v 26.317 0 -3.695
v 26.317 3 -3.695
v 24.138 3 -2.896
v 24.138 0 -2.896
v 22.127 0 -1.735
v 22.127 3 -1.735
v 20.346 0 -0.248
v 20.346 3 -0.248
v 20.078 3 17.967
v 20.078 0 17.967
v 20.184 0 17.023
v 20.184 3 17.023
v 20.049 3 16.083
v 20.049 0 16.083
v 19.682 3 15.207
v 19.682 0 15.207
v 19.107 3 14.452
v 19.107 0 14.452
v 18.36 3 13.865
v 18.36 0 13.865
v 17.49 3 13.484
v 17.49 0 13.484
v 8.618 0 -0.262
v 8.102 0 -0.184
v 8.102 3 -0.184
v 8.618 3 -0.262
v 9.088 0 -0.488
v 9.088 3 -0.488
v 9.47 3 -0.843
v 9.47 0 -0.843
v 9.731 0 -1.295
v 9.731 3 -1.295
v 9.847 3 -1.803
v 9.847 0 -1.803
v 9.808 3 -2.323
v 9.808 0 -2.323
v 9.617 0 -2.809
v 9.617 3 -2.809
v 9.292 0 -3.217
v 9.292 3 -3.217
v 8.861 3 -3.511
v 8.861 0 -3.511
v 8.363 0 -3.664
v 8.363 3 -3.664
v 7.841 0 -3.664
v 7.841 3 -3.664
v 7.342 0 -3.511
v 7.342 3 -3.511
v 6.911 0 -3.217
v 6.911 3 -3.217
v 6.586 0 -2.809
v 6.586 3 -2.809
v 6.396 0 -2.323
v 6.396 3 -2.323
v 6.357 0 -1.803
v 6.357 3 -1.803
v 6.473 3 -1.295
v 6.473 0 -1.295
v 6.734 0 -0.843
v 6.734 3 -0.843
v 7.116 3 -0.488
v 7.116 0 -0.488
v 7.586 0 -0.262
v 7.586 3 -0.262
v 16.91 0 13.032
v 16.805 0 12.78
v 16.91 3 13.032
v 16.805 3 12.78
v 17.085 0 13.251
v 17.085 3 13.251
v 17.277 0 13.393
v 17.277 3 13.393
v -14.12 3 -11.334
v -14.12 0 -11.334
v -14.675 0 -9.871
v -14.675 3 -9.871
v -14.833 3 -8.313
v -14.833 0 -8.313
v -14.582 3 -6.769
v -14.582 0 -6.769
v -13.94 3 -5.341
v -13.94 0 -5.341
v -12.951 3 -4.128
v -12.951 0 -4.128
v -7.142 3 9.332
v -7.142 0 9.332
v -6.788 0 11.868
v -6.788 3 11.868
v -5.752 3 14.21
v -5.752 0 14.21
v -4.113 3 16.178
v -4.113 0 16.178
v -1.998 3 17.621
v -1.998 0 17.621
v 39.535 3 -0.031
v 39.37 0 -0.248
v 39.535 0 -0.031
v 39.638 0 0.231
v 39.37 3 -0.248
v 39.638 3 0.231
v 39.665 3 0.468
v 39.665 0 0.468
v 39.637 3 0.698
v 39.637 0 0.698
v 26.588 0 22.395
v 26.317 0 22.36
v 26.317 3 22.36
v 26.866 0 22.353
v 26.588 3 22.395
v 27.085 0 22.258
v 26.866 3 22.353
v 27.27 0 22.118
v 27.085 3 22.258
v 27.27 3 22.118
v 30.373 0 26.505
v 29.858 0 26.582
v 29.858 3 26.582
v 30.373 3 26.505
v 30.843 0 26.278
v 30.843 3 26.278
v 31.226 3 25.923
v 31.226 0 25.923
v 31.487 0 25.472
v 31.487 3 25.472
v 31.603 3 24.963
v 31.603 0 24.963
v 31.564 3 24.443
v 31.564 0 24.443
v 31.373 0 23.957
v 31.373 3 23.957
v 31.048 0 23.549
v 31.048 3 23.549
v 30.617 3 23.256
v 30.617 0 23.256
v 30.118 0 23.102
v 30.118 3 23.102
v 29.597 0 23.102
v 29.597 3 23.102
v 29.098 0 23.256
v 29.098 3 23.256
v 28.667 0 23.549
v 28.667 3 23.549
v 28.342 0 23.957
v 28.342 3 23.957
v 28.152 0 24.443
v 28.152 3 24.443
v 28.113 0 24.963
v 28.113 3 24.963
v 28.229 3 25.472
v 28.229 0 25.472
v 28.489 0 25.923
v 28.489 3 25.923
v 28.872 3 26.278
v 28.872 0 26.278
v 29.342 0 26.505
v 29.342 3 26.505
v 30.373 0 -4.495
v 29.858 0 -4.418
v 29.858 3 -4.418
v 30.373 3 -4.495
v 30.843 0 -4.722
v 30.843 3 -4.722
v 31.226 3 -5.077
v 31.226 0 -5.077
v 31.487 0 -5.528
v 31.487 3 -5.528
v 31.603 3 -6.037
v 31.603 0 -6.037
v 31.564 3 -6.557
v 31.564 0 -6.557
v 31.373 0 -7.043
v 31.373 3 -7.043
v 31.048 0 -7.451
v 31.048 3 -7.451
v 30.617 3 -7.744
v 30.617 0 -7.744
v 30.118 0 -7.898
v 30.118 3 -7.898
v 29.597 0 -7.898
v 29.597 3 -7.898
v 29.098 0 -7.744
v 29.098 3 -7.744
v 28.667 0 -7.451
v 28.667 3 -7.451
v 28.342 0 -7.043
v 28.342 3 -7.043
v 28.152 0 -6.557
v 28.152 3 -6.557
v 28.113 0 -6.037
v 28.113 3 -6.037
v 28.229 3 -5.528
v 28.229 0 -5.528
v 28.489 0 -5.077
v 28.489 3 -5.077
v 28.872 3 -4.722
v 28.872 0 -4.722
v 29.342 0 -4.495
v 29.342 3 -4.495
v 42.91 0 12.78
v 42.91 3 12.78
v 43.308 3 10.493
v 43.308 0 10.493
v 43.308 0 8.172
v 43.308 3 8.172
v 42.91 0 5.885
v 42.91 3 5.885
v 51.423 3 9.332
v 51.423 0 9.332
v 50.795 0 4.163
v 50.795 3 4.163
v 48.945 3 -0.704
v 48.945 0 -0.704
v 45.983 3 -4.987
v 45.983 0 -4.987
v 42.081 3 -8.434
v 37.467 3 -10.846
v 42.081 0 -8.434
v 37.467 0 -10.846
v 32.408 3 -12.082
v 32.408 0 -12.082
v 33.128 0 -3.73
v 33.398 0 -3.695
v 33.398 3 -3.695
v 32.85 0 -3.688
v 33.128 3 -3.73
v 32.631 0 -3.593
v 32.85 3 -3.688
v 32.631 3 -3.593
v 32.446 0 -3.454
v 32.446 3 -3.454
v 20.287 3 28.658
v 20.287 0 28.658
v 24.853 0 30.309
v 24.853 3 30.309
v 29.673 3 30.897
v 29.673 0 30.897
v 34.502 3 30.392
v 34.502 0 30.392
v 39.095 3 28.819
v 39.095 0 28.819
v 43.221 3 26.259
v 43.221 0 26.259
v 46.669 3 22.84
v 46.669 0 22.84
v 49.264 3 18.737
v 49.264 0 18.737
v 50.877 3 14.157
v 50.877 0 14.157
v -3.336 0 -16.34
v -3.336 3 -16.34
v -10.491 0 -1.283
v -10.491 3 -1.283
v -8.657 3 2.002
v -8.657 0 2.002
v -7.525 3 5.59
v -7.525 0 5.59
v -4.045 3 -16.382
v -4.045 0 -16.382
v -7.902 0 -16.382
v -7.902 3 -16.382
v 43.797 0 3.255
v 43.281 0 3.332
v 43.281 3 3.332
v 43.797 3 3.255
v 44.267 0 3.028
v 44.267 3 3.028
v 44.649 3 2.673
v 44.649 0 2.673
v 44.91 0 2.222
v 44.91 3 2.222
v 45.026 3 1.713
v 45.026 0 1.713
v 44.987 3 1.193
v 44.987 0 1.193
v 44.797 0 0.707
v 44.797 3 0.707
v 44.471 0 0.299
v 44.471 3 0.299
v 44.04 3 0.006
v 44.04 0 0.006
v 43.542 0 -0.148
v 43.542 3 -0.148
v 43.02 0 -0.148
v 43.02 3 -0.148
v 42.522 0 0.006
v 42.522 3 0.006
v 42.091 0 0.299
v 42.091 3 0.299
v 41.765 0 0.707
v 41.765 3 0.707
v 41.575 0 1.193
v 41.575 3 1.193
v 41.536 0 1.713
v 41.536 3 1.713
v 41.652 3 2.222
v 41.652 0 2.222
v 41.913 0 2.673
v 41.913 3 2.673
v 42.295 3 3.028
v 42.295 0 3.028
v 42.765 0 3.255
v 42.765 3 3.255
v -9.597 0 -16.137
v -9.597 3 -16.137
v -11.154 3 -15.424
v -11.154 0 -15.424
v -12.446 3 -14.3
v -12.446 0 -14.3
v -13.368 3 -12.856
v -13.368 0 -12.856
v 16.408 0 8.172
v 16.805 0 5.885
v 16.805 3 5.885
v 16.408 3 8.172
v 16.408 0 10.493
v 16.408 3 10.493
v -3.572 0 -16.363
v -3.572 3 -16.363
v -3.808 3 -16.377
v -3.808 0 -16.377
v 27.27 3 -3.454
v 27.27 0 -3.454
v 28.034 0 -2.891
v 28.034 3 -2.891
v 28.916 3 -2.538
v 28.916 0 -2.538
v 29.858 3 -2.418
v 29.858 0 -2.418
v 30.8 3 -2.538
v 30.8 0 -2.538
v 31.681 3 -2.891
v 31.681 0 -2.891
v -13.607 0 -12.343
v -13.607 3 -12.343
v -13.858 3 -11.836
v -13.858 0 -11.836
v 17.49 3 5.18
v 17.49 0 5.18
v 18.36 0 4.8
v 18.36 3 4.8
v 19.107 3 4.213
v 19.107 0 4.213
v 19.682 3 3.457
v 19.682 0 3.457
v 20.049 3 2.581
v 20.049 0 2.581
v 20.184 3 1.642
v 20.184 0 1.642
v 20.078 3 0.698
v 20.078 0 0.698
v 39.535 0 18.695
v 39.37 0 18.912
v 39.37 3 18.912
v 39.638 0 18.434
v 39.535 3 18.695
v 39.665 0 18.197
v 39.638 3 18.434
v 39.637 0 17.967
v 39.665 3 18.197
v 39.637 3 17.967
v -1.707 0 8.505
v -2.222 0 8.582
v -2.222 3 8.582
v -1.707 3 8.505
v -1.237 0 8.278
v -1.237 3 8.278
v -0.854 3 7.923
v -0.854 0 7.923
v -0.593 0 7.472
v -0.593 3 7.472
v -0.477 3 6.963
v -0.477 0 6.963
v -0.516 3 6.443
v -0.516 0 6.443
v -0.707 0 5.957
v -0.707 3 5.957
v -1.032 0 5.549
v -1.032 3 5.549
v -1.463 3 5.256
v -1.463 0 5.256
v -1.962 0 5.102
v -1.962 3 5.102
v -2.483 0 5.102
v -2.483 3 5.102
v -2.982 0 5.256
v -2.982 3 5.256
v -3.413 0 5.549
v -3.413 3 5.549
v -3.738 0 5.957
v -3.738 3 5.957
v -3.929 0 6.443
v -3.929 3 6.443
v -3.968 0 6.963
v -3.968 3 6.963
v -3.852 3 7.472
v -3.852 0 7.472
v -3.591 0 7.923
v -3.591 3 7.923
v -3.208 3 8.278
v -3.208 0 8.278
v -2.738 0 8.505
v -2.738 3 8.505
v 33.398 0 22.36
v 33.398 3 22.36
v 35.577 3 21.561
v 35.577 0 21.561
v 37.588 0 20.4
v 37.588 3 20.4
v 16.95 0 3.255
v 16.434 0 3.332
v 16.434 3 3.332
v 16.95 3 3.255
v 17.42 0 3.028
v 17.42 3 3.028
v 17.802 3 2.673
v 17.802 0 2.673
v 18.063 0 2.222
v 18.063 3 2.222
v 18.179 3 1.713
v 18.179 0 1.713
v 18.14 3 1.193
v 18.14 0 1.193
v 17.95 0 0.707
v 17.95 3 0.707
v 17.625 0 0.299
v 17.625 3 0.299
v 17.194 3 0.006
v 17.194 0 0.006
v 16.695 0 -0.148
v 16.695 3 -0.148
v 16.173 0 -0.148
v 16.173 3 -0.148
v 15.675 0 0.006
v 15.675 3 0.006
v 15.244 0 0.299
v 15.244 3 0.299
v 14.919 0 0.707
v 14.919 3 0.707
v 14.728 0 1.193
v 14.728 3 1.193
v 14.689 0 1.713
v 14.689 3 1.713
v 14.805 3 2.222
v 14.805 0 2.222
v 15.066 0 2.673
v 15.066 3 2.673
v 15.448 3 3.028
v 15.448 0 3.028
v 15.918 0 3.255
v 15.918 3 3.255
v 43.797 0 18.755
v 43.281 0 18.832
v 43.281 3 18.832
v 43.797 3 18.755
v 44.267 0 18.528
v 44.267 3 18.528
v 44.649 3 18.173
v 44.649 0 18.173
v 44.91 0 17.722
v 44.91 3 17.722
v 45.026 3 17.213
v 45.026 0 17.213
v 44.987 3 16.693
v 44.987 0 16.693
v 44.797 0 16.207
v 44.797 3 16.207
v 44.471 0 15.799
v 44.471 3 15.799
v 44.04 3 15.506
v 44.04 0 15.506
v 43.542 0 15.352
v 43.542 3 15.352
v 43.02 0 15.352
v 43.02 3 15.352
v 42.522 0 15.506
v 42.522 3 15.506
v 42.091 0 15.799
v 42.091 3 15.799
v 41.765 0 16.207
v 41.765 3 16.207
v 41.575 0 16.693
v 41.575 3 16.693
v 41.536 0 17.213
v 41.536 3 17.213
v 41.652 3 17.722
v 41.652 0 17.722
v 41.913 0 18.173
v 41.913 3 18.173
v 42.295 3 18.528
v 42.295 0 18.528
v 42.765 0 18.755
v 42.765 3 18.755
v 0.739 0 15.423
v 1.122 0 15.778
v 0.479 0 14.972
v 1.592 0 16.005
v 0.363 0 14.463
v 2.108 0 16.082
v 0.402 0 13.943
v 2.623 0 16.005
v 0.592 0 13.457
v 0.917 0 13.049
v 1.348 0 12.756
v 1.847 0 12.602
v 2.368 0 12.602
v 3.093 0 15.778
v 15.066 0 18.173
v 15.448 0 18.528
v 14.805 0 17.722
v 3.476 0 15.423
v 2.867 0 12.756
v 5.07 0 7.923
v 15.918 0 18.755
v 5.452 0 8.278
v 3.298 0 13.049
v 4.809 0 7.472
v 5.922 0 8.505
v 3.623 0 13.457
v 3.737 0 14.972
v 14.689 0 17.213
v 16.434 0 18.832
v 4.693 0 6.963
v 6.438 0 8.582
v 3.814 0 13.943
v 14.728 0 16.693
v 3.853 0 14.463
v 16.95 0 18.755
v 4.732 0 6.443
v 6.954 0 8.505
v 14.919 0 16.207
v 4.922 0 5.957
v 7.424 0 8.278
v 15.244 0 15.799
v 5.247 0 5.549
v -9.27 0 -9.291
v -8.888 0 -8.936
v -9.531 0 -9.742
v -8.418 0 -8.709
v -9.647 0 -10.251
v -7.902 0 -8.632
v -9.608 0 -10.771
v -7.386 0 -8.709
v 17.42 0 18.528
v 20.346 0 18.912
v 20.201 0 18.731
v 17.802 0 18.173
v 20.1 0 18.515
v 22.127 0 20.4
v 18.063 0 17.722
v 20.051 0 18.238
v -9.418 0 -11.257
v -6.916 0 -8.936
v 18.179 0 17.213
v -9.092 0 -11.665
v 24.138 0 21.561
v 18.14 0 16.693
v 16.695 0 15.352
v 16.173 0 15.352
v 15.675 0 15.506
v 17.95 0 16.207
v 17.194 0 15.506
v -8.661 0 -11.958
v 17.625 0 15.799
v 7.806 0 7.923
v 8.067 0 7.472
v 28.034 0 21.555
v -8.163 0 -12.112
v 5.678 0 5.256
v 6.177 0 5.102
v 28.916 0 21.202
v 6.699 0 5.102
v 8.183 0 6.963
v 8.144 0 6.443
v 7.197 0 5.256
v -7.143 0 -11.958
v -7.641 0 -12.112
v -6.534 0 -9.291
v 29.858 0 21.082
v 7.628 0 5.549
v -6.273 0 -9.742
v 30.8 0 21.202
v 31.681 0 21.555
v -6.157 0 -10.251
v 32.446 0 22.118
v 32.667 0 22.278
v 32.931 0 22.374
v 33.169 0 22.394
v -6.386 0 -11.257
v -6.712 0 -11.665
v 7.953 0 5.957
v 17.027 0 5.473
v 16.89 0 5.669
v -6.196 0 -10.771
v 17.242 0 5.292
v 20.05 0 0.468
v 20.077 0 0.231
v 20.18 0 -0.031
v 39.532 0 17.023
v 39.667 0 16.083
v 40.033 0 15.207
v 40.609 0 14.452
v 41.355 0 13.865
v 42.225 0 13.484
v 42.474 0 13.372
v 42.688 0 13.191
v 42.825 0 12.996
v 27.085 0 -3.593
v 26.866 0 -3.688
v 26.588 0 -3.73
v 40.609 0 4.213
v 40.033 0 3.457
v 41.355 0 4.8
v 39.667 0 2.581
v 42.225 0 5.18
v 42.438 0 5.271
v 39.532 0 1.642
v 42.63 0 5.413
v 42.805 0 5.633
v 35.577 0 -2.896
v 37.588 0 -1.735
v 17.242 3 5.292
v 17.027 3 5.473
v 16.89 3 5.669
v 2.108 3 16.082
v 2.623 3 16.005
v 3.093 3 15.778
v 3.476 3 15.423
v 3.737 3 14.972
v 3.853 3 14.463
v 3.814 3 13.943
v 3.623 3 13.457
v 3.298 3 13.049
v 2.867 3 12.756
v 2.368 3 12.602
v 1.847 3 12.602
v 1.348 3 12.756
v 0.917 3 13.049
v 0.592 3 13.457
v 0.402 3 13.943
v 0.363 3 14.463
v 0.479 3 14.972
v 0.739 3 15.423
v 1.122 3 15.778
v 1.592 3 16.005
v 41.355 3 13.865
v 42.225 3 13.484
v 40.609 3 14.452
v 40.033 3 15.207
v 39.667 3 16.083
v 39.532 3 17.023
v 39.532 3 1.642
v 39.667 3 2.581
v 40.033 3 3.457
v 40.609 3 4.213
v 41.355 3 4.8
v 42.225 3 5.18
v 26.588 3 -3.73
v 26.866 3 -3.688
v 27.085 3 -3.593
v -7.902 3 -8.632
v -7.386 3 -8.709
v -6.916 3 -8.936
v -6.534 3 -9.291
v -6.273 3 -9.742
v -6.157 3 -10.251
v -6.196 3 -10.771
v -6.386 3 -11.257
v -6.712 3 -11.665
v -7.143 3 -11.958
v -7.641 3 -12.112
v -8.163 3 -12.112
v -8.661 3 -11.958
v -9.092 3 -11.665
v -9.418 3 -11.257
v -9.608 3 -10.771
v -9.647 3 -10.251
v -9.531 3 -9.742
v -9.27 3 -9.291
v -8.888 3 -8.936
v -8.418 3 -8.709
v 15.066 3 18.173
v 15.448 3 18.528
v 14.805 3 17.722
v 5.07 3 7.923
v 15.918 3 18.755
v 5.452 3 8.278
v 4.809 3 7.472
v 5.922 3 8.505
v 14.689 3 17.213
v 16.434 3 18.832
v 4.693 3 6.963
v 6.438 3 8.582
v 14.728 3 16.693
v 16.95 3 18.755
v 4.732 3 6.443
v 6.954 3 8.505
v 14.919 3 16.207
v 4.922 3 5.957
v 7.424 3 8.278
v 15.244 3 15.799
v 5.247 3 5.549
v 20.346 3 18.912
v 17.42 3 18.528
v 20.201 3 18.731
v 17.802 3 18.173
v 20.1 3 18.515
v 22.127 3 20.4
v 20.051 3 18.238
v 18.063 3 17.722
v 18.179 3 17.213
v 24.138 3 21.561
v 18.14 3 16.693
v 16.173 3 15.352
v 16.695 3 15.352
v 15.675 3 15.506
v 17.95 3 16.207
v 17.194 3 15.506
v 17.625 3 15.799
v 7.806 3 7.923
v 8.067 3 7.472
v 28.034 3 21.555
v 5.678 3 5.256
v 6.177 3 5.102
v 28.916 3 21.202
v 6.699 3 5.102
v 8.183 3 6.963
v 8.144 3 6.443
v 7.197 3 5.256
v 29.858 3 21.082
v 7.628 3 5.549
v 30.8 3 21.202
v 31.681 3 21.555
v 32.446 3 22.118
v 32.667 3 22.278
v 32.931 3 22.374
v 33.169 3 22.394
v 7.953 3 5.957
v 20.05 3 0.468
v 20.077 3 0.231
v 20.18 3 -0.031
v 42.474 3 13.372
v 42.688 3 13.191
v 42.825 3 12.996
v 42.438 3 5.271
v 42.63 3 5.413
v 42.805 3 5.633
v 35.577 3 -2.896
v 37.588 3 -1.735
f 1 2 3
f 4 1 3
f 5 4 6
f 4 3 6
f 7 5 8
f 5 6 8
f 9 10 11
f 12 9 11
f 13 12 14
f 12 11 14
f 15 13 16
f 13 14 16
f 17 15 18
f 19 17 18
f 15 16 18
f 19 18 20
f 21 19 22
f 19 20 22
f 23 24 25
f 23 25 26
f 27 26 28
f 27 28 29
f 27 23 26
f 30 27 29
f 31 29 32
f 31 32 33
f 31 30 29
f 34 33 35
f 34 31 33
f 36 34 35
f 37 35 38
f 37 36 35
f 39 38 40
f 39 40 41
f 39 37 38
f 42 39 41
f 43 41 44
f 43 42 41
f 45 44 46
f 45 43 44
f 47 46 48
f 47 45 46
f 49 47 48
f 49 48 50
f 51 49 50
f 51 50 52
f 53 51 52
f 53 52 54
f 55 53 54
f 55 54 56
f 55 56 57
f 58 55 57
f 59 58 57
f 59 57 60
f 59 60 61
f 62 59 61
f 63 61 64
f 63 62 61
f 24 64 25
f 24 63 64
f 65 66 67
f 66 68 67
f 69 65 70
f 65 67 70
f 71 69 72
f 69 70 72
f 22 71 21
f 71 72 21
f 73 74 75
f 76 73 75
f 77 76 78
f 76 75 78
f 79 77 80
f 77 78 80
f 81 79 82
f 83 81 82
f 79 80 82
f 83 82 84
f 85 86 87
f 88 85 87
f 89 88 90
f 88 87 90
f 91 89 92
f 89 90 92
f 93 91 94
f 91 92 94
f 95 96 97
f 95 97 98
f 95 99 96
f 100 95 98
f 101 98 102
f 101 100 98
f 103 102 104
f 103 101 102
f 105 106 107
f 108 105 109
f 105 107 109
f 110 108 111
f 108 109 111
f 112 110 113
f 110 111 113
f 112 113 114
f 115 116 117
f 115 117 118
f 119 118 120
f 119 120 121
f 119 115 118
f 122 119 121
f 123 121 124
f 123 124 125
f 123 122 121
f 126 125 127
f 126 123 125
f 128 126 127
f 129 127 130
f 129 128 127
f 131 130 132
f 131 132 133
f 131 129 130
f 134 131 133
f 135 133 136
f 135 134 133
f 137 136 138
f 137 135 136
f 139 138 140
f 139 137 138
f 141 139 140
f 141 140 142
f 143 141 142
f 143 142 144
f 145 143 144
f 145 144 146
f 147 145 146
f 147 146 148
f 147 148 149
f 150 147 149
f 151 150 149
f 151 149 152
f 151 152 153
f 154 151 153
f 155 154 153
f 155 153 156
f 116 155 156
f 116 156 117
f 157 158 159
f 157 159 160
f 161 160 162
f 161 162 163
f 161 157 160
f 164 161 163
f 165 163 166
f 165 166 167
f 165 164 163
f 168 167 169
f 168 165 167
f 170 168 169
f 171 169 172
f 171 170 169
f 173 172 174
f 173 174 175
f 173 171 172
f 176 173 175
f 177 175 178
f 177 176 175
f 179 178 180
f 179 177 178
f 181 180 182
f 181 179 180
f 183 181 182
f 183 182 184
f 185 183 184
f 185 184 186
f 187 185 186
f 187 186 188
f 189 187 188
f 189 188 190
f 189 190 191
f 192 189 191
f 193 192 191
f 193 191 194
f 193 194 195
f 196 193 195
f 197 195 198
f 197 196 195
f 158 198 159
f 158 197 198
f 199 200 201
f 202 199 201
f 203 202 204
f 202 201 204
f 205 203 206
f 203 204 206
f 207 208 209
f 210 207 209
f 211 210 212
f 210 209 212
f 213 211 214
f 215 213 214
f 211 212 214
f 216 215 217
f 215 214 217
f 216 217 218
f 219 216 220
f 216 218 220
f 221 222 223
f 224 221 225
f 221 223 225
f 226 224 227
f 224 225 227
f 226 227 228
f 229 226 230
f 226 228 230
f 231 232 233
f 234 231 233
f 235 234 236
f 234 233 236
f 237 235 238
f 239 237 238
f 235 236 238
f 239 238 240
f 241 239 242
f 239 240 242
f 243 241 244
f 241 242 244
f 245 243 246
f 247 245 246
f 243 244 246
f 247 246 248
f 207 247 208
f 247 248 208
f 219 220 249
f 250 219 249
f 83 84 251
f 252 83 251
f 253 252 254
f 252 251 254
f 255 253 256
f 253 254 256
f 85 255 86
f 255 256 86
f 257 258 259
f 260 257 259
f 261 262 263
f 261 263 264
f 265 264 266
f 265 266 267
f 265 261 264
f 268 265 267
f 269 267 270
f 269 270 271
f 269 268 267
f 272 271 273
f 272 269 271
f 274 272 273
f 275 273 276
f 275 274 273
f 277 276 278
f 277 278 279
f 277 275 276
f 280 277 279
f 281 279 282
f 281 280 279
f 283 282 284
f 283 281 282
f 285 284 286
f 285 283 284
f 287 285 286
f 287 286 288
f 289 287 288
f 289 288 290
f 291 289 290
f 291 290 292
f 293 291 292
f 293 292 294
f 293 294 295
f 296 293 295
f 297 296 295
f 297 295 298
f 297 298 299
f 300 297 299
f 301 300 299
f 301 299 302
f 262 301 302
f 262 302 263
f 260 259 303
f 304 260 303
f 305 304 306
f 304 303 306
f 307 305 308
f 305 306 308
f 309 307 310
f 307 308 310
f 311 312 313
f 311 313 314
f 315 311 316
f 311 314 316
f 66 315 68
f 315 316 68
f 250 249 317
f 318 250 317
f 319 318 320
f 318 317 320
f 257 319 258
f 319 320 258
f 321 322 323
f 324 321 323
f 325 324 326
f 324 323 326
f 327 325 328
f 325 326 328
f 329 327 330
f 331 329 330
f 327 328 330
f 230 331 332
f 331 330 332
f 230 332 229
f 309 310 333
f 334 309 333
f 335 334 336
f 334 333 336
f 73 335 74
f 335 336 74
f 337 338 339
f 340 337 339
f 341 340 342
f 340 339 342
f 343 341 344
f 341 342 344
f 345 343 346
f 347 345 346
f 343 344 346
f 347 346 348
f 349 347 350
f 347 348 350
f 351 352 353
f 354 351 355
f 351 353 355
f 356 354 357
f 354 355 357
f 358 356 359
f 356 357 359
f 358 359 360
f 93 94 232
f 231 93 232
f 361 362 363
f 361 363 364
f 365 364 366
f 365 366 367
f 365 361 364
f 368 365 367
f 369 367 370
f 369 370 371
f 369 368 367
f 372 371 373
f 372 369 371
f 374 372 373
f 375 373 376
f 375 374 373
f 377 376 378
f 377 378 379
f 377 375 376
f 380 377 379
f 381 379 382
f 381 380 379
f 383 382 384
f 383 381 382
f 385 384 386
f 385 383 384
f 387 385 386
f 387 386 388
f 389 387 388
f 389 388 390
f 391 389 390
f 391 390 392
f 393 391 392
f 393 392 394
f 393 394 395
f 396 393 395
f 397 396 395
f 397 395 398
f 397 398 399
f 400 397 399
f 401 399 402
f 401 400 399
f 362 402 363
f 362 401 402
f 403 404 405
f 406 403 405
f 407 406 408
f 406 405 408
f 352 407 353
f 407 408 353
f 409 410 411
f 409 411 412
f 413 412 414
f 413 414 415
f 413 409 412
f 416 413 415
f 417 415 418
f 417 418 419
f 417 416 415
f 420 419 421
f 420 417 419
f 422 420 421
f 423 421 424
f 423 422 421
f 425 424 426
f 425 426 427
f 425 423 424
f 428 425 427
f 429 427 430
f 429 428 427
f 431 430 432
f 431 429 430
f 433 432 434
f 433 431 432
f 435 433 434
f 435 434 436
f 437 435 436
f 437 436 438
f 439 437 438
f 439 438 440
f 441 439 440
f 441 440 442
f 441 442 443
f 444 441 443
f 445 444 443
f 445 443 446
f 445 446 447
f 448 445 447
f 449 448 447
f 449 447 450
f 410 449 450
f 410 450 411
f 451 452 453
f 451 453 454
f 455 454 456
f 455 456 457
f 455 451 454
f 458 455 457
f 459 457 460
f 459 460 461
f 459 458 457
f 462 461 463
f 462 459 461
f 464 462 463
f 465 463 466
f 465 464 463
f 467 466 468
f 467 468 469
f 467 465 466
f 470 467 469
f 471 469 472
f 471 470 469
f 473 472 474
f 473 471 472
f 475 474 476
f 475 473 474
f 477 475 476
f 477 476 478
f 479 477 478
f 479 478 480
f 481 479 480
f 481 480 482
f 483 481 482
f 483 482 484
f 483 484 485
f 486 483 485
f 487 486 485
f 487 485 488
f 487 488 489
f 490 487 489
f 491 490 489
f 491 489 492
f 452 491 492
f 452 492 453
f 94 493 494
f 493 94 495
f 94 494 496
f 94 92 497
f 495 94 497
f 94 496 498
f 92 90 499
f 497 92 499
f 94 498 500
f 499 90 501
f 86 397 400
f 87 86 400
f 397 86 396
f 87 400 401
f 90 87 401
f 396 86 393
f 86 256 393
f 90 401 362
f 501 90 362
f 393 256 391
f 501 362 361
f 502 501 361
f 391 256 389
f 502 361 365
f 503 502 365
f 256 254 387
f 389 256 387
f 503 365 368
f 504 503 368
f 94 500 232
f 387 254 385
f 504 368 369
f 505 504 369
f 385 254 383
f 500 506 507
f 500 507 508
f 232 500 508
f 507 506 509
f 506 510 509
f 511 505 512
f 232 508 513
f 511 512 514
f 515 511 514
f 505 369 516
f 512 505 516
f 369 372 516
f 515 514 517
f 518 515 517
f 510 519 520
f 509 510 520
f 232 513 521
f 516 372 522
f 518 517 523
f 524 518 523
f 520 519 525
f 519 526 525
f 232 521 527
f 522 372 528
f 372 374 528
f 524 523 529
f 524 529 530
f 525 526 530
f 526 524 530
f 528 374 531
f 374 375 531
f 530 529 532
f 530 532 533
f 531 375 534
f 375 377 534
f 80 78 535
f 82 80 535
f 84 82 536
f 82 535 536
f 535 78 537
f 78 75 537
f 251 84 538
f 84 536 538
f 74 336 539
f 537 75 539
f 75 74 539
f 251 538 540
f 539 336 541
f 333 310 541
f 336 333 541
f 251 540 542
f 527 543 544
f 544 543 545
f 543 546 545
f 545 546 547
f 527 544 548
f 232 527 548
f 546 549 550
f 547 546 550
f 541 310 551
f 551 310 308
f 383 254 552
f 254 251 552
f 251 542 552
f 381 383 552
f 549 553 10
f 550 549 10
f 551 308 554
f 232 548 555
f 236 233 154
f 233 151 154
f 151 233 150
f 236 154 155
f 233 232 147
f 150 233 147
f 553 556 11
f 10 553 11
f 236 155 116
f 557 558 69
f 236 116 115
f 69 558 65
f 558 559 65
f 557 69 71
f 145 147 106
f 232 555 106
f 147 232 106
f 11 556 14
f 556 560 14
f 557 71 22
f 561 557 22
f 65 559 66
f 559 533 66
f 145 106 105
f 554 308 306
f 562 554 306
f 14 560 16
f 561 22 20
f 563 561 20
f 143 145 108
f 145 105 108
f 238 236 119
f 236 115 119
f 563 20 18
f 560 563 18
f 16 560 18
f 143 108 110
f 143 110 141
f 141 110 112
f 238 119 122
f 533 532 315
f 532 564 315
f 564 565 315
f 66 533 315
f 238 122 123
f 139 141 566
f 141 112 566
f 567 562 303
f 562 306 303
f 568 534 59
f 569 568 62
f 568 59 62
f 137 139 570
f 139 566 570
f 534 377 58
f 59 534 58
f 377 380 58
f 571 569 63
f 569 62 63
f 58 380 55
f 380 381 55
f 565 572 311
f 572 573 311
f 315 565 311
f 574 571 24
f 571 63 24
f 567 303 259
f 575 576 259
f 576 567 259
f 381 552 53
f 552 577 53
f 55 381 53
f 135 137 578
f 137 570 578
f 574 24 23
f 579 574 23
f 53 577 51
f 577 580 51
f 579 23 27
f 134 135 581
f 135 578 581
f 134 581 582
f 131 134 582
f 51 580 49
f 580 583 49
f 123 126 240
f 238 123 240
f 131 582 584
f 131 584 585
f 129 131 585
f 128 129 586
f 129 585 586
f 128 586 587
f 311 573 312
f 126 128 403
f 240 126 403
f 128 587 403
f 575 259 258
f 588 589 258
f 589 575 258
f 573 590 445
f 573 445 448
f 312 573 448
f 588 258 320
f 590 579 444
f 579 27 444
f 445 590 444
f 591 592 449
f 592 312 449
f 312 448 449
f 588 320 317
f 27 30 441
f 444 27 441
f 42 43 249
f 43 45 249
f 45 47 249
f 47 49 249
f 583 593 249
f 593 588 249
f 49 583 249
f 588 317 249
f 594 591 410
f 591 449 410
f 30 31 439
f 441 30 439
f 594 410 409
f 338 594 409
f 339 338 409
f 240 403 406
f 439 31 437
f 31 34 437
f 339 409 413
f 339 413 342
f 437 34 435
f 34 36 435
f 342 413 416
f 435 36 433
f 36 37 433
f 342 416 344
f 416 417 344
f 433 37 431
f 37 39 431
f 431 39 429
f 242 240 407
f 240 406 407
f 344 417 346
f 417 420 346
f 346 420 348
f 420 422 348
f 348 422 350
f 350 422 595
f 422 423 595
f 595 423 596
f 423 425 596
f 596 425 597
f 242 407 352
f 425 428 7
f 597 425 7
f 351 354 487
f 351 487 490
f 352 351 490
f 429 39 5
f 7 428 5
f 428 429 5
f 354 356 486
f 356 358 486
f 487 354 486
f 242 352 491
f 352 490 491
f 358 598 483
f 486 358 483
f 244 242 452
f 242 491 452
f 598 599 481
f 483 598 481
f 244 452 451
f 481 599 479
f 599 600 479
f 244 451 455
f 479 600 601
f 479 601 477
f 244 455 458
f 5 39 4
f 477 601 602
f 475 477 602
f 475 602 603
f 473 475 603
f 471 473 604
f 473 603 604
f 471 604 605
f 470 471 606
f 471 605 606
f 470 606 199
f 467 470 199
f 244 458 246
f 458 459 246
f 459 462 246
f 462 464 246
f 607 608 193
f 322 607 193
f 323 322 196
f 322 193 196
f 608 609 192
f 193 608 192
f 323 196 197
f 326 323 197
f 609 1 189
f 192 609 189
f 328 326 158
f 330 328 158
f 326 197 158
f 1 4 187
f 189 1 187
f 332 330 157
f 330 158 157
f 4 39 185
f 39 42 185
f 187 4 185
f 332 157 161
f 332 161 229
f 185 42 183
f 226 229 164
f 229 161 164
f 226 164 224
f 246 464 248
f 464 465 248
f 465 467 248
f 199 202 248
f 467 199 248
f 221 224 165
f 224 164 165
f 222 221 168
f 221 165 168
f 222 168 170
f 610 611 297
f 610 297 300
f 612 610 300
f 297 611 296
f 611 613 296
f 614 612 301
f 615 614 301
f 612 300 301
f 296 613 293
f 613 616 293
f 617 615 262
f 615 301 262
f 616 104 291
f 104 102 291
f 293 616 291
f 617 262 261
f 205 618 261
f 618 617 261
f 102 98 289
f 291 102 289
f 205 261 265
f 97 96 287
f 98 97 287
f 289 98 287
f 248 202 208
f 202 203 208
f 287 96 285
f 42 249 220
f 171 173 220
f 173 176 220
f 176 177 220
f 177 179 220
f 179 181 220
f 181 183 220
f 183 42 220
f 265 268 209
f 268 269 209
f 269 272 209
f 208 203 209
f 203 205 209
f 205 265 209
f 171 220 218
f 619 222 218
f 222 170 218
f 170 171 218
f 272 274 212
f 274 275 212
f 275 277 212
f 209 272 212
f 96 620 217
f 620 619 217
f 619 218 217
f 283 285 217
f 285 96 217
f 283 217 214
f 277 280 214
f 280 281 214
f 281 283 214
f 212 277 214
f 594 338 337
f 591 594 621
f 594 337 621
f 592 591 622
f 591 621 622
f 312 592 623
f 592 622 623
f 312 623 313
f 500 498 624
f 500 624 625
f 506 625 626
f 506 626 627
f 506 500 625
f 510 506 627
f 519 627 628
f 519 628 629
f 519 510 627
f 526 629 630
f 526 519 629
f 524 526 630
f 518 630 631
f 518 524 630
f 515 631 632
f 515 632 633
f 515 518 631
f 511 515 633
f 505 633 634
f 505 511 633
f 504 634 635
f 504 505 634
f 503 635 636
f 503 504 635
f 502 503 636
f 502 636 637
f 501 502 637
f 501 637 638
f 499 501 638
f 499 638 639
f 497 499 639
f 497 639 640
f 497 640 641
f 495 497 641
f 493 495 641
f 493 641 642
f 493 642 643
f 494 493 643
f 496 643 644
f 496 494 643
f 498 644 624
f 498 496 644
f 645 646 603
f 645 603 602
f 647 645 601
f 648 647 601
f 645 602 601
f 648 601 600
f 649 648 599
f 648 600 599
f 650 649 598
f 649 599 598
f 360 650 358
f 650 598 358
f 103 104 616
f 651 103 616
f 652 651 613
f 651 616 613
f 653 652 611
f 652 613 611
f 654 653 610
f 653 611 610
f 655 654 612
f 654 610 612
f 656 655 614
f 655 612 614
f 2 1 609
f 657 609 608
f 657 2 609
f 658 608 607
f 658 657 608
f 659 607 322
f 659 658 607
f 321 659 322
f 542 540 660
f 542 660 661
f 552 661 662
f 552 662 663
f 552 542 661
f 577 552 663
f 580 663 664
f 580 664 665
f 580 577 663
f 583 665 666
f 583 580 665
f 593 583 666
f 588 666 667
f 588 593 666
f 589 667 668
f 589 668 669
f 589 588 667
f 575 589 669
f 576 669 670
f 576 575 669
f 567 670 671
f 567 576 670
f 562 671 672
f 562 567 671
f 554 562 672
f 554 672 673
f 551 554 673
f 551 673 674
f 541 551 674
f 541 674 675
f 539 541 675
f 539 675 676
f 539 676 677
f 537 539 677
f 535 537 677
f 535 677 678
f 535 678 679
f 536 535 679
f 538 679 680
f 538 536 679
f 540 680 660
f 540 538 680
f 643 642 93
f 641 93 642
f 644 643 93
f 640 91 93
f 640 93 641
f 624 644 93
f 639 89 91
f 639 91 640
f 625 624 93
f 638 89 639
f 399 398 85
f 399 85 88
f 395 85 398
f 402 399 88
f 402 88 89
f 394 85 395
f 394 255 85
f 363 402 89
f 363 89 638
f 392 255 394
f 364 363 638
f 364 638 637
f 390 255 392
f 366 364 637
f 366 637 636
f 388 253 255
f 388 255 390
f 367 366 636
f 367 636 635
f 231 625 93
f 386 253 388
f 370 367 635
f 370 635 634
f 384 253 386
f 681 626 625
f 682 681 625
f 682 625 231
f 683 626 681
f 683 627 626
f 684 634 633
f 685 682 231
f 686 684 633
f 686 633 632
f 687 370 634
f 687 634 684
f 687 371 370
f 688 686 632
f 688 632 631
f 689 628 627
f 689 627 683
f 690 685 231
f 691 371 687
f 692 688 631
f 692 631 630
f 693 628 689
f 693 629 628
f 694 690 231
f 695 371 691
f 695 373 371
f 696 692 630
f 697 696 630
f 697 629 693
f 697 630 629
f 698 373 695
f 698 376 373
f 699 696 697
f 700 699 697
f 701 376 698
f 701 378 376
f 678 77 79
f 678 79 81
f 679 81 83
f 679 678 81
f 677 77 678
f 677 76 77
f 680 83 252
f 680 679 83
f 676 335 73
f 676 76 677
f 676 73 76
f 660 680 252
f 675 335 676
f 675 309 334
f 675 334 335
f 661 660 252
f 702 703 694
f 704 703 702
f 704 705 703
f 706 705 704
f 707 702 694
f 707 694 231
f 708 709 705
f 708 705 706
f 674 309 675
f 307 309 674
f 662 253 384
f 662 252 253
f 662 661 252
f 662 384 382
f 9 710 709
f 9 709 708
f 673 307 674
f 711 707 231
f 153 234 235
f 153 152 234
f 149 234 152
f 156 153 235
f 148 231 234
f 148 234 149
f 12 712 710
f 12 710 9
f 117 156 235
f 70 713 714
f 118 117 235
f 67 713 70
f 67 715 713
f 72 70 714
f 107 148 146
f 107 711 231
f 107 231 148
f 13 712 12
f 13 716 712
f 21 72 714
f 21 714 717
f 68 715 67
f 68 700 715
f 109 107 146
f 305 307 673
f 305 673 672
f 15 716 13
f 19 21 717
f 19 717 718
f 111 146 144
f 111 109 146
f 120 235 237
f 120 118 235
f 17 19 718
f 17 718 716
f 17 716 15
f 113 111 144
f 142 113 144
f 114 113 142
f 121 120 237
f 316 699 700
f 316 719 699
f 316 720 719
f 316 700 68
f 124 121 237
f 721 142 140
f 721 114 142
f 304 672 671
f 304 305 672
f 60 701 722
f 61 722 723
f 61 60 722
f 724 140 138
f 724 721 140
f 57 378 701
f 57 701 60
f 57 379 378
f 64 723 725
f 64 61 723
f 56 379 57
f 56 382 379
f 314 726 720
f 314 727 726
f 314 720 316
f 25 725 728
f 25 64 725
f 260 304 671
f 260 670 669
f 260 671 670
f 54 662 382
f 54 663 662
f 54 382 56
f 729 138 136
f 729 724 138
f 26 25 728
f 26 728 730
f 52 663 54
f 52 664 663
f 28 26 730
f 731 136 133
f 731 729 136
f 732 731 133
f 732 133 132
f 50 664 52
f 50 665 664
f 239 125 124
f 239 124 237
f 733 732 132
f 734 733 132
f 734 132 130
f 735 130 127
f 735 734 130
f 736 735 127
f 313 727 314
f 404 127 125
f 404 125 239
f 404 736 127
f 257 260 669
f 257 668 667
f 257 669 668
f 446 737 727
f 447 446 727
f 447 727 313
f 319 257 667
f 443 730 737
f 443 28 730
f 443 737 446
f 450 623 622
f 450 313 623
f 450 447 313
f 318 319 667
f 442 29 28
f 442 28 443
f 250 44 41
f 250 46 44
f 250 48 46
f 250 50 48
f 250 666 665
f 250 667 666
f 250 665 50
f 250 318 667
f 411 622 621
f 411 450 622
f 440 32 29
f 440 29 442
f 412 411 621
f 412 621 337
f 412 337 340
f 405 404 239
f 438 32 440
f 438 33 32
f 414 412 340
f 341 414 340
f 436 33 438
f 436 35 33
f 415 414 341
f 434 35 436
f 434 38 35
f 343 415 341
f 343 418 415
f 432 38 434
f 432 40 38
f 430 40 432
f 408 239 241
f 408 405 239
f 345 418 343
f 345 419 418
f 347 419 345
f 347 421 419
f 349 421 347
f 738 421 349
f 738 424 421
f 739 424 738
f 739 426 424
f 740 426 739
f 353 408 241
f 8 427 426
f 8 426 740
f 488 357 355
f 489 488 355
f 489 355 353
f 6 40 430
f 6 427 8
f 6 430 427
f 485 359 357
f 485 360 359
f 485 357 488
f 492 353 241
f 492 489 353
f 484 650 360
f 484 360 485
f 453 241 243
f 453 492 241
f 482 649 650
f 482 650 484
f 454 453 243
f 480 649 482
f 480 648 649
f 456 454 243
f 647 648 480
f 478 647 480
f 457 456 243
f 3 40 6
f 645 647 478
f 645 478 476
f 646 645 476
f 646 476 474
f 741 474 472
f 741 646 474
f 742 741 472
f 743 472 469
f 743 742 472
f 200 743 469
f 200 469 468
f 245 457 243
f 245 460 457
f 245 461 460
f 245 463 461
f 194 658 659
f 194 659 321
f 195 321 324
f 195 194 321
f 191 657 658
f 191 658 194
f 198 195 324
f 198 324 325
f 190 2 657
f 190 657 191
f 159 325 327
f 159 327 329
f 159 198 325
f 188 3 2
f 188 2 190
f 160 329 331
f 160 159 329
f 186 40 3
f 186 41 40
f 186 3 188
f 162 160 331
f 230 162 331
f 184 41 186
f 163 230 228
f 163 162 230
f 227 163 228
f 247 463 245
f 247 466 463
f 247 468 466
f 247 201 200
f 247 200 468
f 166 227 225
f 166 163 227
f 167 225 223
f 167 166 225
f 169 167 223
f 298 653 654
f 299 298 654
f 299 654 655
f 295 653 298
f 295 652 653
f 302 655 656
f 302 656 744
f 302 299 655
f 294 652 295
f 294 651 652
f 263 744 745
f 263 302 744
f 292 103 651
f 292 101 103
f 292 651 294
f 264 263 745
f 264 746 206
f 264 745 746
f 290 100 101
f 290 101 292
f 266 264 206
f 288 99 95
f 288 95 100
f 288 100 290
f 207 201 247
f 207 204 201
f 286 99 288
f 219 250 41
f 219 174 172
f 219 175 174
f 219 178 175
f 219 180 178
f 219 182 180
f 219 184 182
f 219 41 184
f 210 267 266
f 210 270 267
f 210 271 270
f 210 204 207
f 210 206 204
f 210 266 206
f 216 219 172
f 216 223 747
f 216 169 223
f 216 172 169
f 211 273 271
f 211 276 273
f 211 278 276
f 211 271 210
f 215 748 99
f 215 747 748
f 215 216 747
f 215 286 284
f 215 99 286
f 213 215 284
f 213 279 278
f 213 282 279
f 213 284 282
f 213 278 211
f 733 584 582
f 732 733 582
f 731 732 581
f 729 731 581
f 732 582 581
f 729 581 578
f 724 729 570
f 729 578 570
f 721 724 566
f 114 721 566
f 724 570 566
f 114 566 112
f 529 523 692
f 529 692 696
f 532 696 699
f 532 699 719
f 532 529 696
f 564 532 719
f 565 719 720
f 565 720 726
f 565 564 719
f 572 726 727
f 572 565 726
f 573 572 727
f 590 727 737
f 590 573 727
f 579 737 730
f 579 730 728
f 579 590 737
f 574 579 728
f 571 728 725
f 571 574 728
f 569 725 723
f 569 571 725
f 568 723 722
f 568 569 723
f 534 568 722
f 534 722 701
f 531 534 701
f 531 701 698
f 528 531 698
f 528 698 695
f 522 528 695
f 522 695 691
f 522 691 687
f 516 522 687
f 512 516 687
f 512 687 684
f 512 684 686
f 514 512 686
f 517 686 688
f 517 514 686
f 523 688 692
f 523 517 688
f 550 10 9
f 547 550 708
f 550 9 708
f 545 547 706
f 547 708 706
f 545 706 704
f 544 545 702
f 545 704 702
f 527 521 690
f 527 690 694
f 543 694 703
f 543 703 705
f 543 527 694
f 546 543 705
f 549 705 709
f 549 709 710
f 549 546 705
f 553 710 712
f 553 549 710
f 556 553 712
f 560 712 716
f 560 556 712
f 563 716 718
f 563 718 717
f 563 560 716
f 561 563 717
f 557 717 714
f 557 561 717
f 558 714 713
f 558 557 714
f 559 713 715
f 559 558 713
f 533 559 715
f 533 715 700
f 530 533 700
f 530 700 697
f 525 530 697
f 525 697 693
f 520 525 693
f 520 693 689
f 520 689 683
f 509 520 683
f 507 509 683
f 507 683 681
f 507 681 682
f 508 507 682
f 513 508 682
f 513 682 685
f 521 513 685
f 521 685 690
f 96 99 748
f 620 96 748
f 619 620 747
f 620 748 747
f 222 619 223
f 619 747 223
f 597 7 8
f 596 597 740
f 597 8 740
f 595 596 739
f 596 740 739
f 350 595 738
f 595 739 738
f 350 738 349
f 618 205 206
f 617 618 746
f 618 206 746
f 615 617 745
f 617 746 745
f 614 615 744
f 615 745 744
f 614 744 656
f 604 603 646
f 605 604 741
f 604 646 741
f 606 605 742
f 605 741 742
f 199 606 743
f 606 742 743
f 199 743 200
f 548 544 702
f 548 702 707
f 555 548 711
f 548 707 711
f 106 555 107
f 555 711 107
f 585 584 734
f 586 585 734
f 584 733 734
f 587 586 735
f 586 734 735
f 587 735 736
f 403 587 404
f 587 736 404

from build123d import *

# Parameters (mm, degrees)
SKETCH_2_R                       = 1.75
EXTRUDE_1_DEPTH                  = 3
CUT_EXTRUDE_1_REACH              = 62.067
SKETCH_3_R                       = 13.5
EXTRUDE_START                    = -3
SKETCH_4_R                       = 3.75
SKETCH_4_R_2                     = 1.75
EXTRUDE_2_DEPTH                  = 3
FILLET_1_R                       = 1
PATTERN_CIRCULAR_1_COUNT         = 6
FILLET_1_OF_PATTERN_CIRCULAR_1_R = 1


with BuildPart() as part:
    # 草图2 → 凸台-拉伸1 (new body)
    with BuildSketch(Plane(origin=(0, 0, 0), x_dir=(1, 0, 0), z_dir=(0, 1, 0))):
        with BuildLine():
            ThreePointArc((-3.33566455, 16.339576043), (-3.689884424, 16.371156277), (-4.04535307, 16.381695363))
            Line((-4.04535307, 16.381695363), (-7.902002826, 16.381695363))
            ThreePointArc((-7.902002826, 16.381695363), (-11.154056436, 15.423931704), (-13.367877124, 12.856411137))
            ThreePointArc((-13.367877124, 12.856411137), (-13.731255095, 12.088797564), (-14.12049634, 11.333969504))
            ThreePointArc((-14.12049634, 11.333969504), (-14.757788596, 7.532855597), (-12.951275808, 4.128282218))
            ThreePointArc((-12.951275808, 4.128282218), (-8.656551428, -2.002025351), (-7.142353364, -9.332273137))
            ThreePointArc((-7.142353364, -9.332273137), (-5.751591288, -14.210272651), (-1.997514606, -17.62143179))
            Line((-1.997514606, -17.62143179), (20.286858748, -28.657647844))
            ThreePointArc((20.286858748, -28.657647844), (50.527581311, -15.482386054), (32.408442676, 12.08182334))
            Line((32.408442676, 12.08182334), (-3.33566455, 16.339576043))
        make_face()
        with Locations((2.107646636, -14.332273137)):
            Circle(SKETCH_2_R, mode=Mode.SUBTRACT)
        with Locations((-2.222480383, -6.832273137)):
            Circle(SKETCH_2_R, mode=Mode.SUBTRACT)
        with Locations((6.437773655, -6.832273137)):
            Circle(SKETCH_2_R, mode=Mode.SUBTRACT)
        with Locations((8.10172473, 1.934042232)):
            Circle(SKETCH_2_R, mode=Mode.SUBTRACT)
        with Locations((-7.902002826, 10.381695363)):
            Circle(SKETCH_2_R, mode=Mode.SUBTRACT)
        with Locations((29.857646636, -24.832273137)):
            Circle(SKETCH_2_R, mode=Mode.SUBTRACT)
        with Locations((43.281040395, -17.082273137)):
            Circle(SKETCH_2_R, mode=Mode.SUBTRACT)
        with Locations((16.434252877, -1.582273137)):
            Circle(SKETCH_2_R, mode=Mode.SUBTRACT)
        with Locations((43.281040395, -1.582273137)):
            Circle(SKETCH_2_R, mode=Mode.SUBTRACT)
        with Locations((29.857646636, 6.167726863)):
            Circle(SKETCH_2_R, mode=Mode.SUBTRACT)
        with Locations((16.434252877, -17.082273137)):
            Circle(SKETCH_2_R, mode=Mode.SUBTRACT)
    extrude(amount=EXTRUDE_1_DEPTH)

    # 草图3 → 切除-拉伸1 (cut, up to next)
    with BuildSketch(Plane(origin=(0, 3, 0), x_dir=(1, 0, 0), z_dir=(0, 1, 0)), mode=Mode.PRIVATE) as cut_extrude_1_sk1:
        with Locations((29.857646636, -9.332273137)):
            Circle(SKETCH_3_R)
    cut_extrude_1_tool1 = extrude(cut_extrude_1_sk1.sketch, amount=-CUT_EXTRUDE_1_REACH, mode=Mode.PRIVATE) & part.part
    add(cut_extrude_1_tool1.solids().sort_by_distance((29.857647, 3, 9.332273))[0], mode=Mode.SUBTRACT)

    # 草图4 → 凸台-拉伸2 (add)
    with BuildSketch(Plane(origin=(0, 3, 0), x_dir=(1, 0, 0), z_dir=(0, 1, 0)).offset(EXTRUDE_START)):
        with Locations((29.857646636, 6.167726863)):
            Circle(SKETCH_4_R)
        with Locations((29.857646636, 6.167726863)):
            Circle(SKETCH_4_R_2, mode=Mode.SUBTRACT)
    extrude_2 = extrude(amount=EXTRUDE_2_DEPTH)

    # 圆角1
    fillet_1_edges = [part.edges().sort_by_distance(p)[0] for p in [
        (32.800222011, 1.5, -3.843130088),
        (26.915071261, 1.5, -3.843130088),
    ]]
    fillet(fillet_1_edges, radius=FILLET_1_R)

    # 阵列(圆周)1: 凸台-拉伸2 ×6 about axis
    pattern_circular_1_axis = Axis((29.857646636, 3, 9.332273137), (0, -1, 0))
    for i in range(1, PATTERN_CIRCULAR_1_COUNT):
        add(extrude_2.rotate(pattern_circular_1_axis, i * 360 / PATTERN_CIRCULAR_1_COUNT))

    # 圆角1 of 阵列(圆周)1
    fillet_1_of_pattern_circular_1_edges = [part.edges().sort_by_distance(p)[0] for p in [
        (42.739168222, 1.5, 5.292916552),
        (39.796592847, 1.5, 0.196226497),
        (39.796592847, 1.5, 18.468319778),
        (42.739168222, 1.5, 13.371629723),
        (26.915071261, 1.5, 22.507676363),
        (32.800222011, 1.5, 22.507676363),
        (16.97612505, 1.5, 13.371629723),
        (19.918700425, 1.5, 18.468319778),
        (19.918700425, 1.5, 0.196226497),
        (16.97612505, 1.5, 5.292916552),
    ]]
    fillet(fillet_1_of_pattern_circular_1_edges, radius=FILLET_1_OF_PATTERN_CIRCULAR_1_R)


solid = part.part
